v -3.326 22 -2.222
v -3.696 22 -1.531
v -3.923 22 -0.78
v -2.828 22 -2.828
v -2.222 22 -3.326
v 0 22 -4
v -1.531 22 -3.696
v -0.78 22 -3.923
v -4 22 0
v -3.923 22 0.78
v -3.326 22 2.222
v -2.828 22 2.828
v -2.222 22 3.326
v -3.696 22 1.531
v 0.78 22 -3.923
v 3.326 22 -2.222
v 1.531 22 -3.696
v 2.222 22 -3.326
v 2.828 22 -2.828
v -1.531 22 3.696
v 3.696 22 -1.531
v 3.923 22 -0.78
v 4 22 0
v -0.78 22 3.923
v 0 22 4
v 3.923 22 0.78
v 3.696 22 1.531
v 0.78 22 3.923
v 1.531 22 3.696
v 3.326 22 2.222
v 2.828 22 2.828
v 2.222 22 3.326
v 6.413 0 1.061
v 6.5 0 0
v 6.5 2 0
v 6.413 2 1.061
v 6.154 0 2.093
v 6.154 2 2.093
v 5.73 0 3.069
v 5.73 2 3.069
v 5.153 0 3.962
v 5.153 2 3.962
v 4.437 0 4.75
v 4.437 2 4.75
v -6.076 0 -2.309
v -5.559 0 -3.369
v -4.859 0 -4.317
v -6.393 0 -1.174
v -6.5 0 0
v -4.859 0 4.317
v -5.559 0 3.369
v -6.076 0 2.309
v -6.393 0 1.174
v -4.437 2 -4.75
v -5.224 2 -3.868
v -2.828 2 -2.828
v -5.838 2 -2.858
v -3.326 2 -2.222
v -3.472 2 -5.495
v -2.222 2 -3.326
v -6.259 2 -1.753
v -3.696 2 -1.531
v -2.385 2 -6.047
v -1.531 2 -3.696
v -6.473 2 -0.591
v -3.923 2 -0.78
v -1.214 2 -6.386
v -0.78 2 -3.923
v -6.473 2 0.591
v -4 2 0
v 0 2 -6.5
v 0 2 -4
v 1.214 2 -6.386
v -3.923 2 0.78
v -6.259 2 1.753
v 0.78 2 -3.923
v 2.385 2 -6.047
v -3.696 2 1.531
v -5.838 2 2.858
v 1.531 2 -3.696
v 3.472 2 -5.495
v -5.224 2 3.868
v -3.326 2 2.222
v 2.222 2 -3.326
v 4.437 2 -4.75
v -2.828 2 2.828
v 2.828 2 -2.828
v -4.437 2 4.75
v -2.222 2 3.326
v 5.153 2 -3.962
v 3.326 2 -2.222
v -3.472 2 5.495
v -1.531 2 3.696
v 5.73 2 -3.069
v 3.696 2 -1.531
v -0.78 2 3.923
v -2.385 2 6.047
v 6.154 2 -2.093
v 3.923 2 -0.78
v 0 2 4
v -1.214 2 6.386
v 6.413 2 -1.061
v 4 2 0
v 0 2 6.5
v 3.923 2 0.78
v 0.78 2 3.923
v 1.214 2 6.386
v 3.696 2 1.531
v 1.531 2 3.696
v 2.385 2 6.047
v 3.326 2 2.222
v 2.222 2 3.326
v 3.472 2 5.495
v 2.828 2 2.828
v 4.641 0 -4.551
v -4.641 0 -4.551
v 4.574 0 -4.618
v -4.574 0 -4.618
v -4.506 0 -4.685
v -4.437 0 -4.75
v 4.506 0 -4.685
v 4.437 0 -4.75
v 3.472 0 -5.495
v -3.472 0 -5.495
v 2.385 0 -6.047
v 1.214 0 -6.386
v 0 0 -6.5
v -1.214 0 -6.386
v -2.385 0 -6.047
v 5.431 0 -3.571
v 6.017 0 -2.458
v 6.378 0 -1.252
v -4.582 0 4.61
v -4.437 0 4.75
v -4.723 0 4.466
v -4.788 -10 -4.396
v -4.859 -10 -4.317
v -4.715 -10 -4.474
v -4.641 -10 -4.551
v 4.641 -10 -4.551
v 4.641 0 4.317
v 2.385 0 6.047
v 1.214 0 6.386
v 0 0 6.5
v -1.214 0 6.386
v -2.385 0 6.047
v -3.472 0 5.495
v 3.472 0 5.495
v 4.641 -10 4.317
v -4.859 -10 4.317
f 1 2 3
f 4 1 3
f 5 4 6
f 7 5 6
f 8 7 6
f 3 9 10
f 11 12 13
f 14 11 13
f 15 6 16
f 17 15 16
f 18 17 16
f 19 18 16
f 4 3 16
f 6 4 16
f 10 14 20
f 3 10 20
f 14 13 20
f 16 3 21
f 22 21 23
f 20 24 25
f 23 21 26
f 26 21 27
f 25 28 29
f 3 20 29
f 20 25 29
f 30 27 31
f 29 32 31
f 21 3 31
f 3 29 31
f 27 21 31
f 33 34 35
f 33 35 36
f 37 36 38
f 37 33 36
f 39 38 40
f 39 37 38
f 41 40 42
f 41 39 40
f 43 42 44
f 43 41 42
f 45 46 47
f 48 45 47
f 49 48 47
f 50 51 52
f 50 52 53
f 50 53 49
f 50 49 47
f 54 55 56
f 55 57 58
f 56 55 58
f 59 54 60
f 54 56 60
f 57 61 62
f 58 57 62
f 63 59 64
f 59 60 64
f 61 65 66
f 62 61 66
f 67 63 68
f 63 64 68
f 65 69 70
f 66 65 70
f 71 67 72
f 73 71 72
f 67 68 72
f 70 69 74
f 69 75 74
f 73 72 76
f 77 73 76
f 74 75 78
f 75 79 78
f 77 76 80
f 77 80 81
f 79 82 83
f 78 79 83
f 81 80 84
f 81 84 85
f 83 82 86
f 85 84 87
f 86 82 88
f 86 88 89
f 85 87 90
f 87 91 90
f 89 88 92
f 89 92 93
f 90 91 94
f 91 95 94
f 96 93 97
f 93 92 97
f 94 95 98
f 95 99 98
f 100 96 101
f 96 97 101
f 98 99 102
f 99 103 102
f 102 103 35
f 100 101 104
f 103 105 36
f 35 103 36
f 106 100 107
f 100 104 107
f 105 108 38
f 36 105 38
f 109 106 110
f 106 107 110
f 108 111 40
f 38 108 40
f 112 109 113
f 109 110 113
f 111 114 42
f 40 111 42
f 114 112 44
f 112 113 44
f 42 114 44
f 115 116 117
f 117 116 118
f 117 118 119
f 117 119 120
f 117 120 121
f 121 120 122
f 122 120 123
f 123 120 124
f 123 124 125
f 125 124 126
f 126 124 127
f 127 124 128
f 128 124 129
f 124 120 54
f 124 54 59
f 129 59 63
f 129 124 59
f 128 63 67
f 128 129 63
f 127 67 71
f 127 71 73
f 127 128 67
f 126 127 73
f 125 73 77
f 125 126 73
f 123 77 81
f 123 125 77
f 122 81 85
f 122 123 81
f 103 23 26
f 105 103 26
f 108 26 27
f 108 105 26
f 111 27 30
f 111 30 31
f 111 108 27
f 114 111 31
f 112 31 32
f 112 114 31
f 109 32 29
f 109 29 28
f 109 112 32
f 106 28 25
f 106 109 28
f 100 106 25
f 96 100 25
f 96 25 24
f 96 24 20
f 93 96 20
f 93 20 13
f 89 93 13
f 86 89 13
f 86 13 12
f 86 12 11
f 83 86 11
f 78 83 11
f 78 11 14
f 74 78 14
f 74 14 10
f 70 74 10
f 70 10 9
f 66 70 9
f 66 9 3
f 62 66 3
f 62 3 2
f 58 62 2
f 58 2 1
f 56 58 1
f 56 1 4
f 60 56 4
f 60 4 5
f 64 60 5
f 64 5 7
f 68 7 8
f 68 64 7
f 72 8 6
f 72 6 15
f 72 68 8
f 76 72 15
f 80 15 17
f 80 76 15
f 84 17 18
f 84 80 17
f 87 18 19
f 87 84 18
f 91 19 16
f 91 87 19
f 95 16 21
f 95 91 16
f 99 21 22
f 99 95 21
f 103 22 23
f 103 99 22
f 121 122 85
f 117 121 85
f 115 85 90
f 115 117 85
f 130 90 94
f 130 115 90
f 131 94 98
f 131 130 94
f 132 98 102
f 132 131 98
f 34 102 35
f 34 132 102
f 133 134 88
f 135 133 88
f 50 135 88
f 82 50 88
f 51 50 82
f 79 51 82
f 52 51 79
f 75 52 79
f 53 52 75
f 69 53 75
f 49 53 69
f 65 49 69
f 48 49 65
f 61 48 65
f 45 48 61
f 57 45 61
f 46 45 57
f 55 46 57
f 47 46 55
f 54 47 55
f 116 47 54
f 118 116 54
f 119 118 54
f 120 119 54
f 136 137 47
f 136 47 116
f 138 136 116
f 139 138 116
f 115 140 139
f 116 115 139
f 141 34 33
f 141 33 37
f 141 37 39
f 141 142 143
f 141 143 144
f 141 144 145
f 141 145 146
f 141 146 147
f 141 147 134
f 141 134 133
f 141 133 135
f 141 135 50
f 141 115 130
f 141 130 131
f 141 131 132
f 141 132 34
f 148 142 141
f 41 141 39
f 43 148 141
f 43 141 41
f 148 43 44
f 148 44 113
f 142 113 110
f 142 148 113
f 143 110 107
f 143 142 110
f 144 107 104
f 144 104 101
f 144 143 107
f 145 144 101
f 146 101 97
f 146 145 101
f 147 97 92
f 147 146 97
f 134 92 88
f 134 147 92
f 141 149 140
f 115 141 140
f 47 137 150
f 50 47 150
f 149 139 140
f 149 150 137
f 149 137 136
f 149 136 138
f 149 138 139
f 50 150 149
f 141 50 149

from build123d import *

# Parameters (mm, degrees)
F0_R     = 4
F1_DEPTH = 22
F0_W     = 8.8741196746
F0_H     = 9.5
F2_DEPTH = 2
F3_DEPTH = 10
F5_DEPTH = 10


with BuildPart() as f1:
    # F0 (on Front) → F1 (new body)
    with BuildSketch(Plane.XZ):
        Circle(F0_R)
    extrude(amount=-F1_DEPTH)

    # F0 (on Front) → F2 (join)
    with BuildSketch(Plane.XZ):
        with BuildLine():
            ThreePointArc((4.4370598373, -4.75), (5.9620000395, -2.5893156487), (6.5, 0))
            ThreePointArc((6.5, 0), (5.9620000395, 2.5893156487), (4.4370598373, 4.75))
            Line((4.4370598373, 4.75), (4.4370598373, -4.75))
        make_face()
        with BuildLine():
            Line((-4.4370598373, 4.75), (4.4370598373, 4.75))
            ThreePointArc((4.4370598373, 4.75), (0, 6.5), (-4.4370598373, 4.75))
        make_face()
        Rectangle(F0_W, F0_H)
        Circle(F0_R, mode=Mode.SUBTRACT)
        with BuildLine():
            ThreePointArc((-4.4370598373, -4.75), (0, -6.5), (4.4370598373, -4.75))
            Line((4.4370598373, -4.75), (-4.4370598373, -4.75))
        make_face()
        with BuildLine():
            Line((-4.4370598373, -4.75), (-4.4370598373, 4.75))
            ThreePointArc((-4.4370598373, 4.75), (-6.5, 0), (-4.4370598373, -4.75))
        make_face()
    extrude(amount=-F2_DEPTH)

    # F3 (add): a face of the model
    f3_faces = [f1.faces().sort_by_distance(p)[0] for p in [
        (0, 0, 0),
    ]]
    extrude(f3_faces, amount=F3_DEPTH)

    # F4 (on face) → F5 (cut)
    with BuildSketch(Plane.XZ.offset(10)):
        with BuildLine():
            ThreePointArc((6.5, 0), (2.3093271481, 6.0759368103), (-4.8590794225, 4.3173310234))
            Line((-4.8590794225, 4.3173310234), (4.6409205775, 4.3173310234))
            Line((4.6409205775, 4.3173310234), (4.6409205775, -4.551028037))
            ThreePointArc((4.6409205775, -4.551028037), (6.0173076934, -2.4580496584), (6.5, 0))
        make_face()
        with BuildLine():
            ThreePointArc((-4.6409205775, -4.551028037), (0, -6.5), (4.6409205775, -4.551028037))
            Line((4.6409205775, -4.551028037), (-4.6409205775, -4.551028037))
        make_face()
        with BuildLine():
            Line((-4.8590794225, -4.3173310234), (-4.8590794225, 4.3173310234))
            ThreePointArc((-4.8590794225, 4.3173310234), (-6.5, 0), (-4.8590794225, -4.3173310234))
        make_face()
    extrude(amount=-F5_DEPTH, mode=Mode.SUBTRACT)


solid = f1.part
